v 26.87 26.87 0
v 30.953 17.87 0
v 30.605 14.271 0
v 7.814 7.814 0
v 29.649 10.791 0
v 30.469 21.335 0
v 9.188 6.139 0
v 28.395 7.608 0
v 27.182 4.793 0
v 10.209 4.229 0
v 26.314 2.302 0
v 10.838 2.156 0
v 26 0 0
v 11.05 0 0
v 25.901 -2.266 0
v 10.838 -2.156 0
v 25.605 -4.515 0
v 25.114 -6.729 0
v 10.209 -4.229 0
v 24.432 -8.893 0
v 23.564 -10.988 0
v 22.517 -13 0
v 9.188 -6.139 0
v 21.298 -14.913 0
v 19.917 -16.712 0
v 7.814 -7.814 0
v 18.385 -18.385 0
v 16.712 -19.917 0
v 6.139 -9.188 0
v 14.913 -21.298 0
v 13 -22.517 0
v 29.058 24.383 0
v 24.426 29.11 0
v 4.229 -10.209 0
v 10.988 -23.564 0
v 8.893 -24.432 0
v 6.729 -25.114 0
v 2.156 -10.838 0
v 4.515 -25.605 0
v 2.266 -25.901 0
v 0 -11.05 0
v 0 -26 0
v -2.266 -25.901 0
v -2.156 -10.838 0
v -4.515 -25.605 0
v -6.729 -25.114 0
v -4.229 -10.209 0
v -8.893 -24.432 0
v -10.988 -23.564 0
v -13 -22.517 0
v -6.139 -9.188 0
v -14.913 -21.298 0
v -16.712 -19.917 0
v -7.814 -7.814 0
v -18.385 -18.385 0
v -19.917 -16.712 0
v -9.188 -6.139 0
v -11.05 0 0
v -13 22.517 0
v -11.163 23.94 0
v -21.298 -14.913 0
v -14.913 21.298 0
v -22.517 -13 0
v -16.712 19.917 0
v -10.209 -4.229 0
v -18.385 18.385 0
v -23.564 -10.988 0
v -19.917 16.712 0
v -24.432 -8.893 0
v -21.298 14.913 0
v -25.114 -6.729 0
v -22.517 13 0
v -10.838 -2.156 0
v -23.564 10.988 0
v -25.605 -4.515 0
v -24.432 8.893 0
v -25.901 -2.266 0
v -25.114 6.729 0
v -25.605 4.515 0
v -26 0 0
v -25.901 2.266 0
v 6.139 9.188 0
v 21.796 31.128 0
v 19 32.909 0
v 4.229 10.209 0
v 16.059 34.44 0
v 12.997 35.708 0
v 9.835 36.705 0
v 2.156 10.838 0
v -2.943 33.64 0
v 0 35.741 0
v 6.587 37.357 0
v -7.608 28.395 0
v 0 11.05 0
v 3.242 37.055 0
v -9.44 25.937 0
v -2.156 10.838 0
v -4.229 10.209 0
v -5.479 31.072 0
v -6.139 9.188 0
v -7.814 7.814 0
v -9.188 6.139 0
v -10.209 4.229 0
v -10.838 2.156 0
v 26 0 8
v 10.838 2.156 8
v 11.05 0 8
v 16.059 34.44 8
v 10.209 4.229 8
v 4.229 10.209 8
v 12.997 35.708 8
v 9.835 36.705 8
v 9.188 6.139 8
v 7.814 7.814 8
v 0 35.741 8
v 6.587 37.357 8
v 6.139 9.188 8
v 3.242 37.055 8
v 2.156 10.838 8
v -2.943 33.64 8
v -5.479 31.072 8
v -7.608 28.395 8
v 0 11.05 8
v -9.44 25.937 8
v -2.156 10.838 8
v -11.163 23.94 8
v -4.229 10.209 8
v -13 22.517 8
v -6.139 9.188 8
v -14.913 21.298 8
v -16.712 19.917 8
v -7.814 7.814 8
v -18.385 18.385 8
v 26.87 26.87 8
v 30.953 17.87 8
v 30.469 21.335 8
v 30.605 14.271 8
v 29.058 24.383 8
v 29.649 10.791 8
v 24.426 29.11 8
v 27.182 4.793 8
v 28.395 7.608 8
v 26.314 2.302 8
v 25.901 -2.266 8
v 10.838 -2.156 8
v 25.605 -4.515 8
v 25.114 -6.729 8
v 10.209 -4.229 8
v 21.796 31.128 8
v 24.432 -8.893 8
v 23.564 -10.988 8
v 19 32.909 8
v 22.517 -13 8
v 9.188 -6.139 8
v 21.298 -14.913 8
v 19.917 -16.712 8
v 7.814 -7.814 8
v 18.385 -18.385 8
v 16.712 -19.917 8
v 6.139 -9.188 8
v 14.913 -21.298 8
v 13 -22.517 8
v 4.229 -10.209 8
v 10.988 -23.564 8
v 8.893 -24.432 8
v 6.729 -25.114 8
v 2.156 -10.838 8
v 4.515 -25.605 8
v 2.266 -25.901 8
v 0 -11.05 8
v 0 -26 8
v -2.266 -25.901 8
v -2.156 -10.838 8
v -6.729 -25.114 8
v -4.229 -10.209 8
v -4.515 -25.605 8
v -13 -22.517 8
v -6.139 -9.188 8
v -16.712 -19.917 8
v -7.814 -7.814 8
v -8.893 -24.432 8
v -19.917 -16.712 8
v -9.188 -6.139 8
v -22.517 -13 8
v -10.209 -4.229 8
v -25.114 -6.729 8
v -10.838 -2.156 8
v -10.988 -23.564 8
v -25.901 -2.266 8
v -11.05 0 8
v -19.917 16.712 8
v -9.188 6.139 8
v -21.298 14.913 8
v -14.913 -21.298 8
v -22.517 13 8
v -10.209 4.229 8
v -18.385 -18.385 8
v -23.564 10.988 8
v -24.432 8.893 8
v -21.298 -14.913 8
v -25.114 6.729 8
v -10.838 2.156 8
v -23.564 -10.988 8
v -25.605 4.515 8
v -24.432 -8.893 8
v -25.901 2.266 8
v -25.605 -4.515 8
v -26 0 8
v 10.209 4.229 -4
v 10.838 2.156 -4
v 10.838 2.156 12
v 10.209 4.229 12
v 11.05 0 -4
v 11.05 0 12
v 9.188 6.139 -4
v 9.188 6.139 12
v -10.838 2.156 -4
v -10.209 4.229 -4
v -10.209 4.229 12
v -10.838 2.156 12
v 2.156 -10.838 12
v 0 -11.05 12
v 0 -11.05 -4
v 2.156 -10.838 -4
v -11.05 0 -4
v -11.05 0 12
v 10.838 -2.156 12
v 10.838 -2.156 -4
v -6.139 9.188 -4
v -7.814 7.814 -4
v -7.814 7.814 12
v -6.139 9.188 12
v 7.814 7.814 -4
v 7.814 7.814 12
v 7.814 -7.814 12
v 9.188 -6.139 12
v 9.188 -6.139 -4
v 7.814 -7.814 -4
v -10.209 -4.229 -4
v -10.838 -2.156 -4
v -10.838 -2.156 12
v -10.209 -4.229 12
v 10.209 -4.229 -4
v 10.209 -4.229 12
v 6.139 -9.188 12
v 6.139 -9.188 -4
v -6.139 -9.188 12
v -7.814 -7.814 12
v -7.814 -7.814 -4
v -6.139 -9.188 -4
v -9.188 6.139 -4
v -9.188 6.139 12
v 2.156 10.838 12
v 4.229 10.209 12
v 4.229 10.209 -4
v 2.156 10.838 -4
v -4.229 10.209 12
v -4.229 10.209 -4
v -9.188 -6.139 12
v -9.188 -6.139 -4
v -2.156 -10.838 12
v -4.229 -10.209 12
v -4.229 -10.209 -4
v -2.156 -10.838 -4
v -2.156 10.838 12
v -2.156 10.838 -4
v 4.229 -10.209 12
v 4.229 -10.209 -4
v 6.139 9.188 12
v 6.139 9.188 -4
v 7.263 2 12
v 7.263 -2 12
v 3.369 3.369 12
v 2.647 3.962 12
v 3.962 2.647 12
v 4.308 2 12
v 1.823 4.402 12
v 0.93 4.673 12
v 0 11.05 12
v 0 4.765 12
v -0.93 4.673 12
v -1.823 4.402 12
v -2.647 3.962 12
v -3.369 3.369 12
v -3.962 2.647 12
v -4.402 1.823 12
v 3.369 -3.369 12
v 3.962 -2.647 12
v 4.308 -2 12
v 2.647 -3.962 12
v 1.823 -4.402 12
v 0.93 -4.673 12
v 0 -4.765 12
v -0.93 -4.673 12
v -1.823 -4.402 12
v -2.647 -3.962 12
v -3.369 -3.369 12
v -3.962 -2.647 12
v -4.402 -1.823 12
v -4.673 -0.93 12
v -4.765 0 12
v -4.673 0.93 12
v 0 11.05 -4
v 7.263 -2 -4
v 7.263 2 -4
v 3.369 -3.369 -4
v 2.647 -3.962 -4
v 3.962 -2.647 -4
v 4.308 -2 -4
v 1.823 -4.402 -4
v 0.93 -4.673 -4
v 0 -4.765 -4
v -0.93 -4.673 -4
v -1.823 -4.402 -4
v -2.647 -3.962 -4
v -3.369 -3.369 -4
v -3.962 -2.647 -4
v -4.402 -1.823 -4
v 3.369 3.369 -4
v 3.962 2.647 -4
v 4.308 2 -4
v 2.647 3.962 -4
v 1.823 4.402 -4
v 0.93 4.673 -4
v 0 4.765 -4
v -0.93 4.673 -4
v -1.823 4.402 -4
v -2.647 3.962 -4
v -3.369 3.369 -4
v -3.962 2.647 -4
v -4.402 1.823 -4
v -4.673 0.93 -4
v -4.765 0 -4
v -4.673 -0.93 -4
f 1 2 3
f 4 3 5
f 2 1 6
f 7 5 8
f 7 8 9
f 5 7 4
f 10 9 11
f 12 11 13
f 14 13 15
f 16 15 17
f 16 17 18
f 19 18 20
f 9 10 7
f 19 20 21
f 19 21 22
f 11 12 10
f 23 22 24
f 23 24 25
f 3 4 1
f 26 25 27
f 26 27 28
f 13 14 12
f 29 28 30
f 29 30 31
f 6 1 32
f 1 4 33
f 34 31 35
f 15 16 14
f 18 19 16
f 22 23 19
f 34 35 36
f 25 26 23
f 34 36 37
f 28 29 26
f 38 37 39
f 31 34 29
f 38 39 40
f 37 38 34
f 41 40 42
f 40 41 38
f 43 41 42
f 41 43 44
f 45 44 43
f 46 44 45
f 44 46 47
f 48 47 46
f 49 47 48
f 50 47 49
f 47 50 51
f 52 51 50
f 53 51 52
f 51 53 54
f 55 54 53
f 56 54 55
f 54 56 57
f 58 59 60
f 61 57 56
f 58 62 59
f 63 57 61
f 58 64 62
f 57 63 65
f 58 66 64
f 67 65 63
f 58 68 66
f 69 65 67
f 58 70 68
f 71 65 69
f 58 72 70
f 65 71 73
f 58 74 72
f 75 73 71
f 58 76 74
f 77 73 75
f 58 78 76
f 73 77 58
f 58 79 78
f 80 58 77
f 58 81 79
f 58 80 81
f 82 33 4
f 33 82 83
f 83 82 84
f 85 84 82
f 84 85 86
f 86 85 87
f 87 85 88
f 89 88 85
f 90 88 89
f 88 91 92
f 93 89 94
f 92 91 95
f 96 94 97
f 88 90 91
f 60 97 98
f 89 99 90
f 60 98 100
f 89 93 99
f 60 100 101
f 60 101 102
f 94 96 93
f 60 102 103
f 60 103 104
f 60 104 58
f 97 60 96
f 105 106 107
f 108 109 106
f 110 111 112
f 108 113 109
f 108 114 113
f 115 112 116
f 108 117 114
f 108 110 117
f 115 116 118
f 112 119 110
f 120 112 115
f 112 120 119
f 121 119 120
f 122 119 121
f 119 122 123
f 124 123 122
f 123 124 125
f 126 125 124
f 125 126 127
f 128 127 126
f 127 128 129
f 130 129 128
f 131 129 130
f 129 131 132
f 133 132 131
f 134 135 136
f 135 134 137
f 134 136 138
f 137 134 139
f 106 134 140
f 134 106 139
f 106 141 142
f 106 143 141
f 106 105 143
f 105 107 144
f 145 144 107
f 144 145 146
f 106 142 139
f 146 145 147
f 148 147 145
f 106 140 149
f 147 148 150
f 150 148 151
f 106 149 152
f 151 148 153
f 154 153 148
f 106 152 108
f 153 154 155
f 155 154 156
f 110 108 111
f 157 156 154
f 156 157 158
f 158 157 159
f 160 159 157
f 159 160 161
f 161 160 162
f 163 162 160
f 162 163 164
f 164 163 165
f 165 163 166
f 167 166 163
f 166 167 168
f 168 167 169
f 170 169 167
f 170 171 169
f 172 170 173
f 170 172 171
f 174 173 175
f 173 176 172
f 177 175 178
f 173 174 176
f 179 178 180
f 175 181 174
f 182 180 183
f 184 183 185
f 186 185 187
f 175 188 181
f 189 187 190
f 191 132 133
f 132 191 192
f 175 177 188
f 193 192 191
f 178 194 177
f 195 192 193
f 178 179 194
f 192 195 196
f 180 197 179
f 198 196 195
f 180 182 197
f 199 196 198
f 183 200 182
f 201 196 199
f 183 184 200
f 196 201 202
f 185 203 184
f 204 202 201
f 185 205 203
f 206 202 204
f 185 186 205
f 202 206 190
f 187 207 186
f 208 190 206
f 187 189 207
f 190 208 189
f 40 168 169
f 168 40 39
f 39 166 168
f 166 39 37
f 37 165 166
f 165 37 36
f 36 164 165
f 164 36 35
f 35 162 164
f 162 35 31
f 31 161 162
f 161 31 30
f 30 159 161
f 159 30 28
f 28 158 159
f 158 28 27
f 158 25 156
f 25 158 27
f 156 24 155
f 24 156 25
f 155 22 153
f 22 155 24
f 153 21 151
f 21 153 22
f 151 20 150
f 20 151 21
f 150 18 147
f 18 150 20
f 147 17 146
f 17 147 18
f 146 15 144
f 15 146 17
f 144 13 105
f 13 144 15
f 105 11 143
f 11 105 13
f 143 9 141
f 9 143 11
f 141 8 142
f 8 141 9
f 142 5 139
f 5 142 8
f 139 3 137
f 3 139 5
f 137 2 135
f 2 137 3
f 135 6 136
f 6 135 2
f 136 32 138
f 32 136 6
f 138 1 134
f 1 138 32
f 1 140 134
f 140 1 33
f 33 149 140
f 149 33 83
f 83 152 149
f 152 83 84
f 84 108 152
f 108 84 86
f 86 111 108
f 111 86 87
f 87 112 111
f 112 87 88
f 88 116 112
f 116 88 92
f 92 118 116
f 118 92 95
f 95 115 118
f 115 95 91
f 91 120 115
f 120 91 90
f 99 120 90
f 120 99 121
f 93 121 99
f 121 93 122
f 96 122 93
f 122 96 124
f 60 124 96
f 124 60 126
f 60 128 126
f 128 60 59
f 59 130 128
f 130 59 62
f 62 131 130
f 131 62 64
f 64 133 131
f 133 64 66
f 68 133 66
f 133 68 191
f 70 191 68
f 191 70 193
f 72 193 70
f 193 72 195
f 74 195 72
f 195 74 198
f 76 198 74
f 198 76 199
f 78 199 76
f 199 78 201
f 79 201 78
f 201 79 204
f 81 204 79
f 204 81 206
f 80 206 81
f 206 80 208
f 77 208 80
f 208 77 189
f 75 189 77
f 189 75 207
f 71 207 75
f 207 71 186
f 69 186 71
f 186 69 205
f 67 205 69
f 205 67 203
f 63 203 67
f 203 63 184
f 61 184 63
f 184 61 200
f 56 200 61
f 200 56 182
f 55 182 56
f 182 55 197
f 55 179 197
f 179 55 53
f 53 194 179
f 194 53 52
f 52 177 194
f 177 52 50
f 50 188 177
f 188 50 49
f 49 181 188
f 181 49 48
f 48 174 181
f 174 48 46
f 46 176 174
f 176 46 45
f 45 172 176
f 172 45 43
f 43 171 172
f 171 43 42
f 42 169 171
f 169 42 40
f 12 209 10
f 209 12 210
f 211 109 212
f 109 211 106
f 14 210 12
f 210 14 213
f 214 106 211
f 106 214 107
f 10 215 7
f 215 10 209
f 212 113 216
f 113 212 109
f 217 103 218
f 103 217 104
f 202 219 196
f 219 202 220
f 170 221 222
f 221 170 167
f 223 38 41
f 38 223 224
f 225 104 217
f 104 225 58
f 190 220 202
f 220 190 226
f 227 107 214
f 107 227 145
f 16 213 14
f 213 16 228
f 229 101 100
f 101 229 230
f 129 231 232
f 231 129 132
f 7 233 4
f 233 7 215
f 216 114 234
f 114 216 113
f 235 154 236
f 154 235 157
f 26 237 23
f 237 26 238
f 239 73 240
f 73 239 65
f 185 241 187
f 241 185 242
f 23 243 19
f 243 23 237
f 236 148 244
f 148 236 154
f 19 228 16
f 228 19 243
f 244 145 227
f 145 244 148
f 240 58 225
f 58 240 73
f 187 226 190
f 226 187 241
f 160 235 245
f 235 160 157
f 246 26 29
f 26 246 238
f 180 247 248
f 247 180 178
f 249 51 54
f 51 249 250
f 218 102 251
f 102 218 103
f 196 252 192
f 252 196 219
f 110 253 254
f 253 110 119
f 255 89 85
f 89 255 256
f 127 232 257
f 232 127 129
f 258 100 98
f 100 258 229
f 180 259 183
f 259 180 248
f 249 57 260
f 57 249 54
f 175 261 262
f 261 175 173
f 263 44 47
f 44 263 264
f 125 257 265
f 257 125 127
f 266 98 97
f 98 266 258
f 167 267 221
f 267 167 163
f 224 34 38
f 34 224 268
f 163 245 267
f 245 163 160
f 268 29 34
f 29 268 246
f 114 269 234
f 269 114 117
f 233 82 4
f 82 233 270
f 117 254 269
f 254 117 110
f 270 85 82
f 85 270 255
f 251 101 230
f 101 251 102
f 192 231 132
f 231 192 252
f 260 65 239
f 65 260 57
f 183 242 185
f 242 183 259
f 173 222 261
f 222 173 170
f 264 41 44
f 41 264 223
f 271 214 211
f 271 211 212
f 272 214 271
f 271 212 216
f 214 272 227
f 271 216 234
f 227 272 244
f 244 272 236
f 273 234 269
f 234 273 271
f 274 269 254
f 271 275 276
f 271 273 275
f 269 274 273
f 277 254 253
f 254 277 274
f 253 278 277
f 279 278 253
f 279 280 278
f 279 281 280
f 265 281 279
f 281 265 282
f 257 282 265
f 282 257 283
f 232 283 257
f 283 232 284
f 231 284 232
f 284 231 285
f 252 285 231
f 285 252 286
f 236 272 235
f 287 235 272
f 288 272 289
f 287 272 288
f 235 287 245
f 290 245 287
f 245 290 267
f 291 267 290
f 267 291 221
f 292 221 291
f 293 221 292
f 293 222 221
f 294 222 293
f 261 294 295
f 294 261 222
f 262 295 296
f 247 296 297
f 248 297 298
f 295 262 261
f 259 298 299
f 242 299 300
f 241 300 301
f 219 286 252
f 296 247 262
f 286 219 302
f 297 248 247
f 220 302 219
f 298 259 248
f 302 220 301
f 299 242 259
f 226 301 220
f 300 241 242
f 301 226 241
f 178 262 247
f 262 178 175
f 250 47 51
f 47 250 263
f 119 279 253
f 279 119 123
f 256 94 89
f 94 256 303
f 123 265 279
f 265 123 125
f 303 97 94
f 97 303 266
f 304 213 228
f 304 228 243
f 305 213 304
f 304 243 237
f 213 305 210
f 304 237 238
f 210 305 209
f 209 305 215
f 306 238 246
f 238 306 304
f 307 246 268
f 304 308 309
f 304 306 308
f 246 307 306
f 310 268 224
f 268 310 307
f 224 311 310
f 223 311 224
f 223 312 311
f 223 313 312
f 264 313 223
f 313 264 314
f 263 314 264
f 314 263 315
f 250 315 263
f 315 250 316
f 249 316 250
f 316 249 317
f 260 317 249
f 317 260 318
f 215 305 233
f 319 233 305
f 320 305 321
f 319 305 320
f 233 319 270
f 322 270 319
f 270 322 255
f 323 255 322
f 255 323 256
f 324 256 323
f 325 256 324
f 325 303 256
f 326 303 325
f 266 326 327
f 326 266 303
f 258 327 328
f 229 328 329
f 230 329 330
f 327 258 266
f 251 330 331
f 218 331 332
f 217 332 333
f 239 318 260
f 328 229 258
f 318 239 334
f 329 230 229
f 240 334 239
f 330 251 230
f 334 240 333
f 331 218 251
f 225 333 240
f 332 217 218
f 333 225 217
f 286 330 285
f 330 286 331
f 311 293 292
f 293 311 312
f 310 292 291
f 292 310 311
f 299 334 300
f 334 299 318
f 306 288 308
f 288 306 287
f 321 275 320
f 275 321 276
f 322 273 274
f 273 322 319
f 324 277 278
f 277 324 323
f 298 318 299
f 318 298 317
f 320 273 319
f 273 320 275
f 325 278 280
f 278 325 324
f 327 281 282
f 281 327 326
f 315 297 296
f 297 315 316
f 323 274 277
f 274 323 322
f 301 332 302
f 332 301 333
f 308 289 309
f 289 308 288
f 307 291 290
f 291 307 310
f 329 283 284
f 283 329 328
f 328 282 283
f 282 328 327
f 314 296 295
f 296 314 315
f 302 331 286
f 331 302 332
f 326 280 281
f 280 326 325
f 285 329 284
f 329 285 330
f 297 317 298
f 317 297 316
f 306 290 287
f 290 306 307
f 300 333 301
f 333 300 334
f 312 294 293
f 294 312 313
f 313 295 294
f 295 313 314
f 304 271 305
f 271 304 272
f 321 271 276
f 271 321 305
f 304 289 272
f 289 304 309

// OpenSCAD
$fn = 32;

// ----------------------------------------------------------------------
// Cam: base radius 26 mm with a 12 mm lift over 120 degrees
// ----------------------------------------------------------------------

// --- parameters (mm) ---
base_r = 26;              // base radius
lift = 12;                // lift height above the base radius
lift_span = 120;          // angular width of the lift
lift_start = 0;           // angle where the lift starts
cam_t = 8;                // cam plate thickness
hub_d = 22.1;             // hub diameter
hub_h = 16;               // hub height
bore_d = 9.53;            // bore
key_w = 4;                // keyway width
key_depth = 2;            // keyway depth

cam_profile = [[26, 0], [26.314, 2.302], [27.182, 4.793], [28.395, 7.608], [29.649, 10.791], [30.605, 14.271], [30.953, 17.87], [30.469, 21.335], [29.058, 24.383], [26.87, 26.87], [24.426, 29.11], [21.796, 31.128], [19, 32.909], [16.059, 34.44], [12.997, 35.708], [9.835, 36.705], [6.587, 37.357], [3.242, 37.055], [0, 35.741], [-2.943, 33.64], [-5.479, 31.072], [-7.608, 28.395], [-9.44, 25.937], [-11.163, 23.94], [-13, 22.517], [-14.913, 21.298], [-16.712, 19.917], [-18.385, 18.385], [-19.917, 16.712], [-21.298, 14.913], [-22.517, 13], [-23.564, 10.988], [-24.432, 8.893], [-25.114, 6.729], [-25.605, 4.515], [-25.901, 2.266], [-26, 0], [-25.901, -2.266], [-25.605, -4.515], [-25.114, -6.729], [-24.432, -8.893], [-23.564, -10.988], [-22.517, -13], [-21.298, -14.913], [-19.917, -16.712], [-18.385, -18.385], [-16.712, -19.917], [-14.913, -21.298], [-13, -22.517], [-10.988, -23.564], [-8.893, -24.432], [-6.729, -25.114], [-4.515, -25.605], [-2.266, -25.901], [0, -26], [2.266, -25.901], [4.515, -25.605], [6.729, -25.114], [8.893, -24.432], [10.988, -23.564], [13, -22.517], [14.913, -21.298], [16.712, -19.917], [18.385, -18.385], [19.917, -16.712], [21.298, -14.913], [22.517, -13], [23.564, -10.988], [24.432, -8.893], [25.114, -6.729], [25.605, -4.515], [25.901, -2.266]];

difference() {
  union() {
    linear_extrude(height = cam_t) polygon(cam_profile);
    /* hub, proud of the cam plate on both sides */
    translate([0, 0, -4]) cylinder(h = hub_h, d = hub_d);
  }
  /* bore through the hub, 2.5 mm clear on both faces */
  translate([0, 0, -6.5]) cylinder(h = hub_h + 5, d = bore_d);
  /* keyway, milled through the whole hub */
  translate([2.763, -2, -6.5]) cube([4.5, 4, 21]);
}
